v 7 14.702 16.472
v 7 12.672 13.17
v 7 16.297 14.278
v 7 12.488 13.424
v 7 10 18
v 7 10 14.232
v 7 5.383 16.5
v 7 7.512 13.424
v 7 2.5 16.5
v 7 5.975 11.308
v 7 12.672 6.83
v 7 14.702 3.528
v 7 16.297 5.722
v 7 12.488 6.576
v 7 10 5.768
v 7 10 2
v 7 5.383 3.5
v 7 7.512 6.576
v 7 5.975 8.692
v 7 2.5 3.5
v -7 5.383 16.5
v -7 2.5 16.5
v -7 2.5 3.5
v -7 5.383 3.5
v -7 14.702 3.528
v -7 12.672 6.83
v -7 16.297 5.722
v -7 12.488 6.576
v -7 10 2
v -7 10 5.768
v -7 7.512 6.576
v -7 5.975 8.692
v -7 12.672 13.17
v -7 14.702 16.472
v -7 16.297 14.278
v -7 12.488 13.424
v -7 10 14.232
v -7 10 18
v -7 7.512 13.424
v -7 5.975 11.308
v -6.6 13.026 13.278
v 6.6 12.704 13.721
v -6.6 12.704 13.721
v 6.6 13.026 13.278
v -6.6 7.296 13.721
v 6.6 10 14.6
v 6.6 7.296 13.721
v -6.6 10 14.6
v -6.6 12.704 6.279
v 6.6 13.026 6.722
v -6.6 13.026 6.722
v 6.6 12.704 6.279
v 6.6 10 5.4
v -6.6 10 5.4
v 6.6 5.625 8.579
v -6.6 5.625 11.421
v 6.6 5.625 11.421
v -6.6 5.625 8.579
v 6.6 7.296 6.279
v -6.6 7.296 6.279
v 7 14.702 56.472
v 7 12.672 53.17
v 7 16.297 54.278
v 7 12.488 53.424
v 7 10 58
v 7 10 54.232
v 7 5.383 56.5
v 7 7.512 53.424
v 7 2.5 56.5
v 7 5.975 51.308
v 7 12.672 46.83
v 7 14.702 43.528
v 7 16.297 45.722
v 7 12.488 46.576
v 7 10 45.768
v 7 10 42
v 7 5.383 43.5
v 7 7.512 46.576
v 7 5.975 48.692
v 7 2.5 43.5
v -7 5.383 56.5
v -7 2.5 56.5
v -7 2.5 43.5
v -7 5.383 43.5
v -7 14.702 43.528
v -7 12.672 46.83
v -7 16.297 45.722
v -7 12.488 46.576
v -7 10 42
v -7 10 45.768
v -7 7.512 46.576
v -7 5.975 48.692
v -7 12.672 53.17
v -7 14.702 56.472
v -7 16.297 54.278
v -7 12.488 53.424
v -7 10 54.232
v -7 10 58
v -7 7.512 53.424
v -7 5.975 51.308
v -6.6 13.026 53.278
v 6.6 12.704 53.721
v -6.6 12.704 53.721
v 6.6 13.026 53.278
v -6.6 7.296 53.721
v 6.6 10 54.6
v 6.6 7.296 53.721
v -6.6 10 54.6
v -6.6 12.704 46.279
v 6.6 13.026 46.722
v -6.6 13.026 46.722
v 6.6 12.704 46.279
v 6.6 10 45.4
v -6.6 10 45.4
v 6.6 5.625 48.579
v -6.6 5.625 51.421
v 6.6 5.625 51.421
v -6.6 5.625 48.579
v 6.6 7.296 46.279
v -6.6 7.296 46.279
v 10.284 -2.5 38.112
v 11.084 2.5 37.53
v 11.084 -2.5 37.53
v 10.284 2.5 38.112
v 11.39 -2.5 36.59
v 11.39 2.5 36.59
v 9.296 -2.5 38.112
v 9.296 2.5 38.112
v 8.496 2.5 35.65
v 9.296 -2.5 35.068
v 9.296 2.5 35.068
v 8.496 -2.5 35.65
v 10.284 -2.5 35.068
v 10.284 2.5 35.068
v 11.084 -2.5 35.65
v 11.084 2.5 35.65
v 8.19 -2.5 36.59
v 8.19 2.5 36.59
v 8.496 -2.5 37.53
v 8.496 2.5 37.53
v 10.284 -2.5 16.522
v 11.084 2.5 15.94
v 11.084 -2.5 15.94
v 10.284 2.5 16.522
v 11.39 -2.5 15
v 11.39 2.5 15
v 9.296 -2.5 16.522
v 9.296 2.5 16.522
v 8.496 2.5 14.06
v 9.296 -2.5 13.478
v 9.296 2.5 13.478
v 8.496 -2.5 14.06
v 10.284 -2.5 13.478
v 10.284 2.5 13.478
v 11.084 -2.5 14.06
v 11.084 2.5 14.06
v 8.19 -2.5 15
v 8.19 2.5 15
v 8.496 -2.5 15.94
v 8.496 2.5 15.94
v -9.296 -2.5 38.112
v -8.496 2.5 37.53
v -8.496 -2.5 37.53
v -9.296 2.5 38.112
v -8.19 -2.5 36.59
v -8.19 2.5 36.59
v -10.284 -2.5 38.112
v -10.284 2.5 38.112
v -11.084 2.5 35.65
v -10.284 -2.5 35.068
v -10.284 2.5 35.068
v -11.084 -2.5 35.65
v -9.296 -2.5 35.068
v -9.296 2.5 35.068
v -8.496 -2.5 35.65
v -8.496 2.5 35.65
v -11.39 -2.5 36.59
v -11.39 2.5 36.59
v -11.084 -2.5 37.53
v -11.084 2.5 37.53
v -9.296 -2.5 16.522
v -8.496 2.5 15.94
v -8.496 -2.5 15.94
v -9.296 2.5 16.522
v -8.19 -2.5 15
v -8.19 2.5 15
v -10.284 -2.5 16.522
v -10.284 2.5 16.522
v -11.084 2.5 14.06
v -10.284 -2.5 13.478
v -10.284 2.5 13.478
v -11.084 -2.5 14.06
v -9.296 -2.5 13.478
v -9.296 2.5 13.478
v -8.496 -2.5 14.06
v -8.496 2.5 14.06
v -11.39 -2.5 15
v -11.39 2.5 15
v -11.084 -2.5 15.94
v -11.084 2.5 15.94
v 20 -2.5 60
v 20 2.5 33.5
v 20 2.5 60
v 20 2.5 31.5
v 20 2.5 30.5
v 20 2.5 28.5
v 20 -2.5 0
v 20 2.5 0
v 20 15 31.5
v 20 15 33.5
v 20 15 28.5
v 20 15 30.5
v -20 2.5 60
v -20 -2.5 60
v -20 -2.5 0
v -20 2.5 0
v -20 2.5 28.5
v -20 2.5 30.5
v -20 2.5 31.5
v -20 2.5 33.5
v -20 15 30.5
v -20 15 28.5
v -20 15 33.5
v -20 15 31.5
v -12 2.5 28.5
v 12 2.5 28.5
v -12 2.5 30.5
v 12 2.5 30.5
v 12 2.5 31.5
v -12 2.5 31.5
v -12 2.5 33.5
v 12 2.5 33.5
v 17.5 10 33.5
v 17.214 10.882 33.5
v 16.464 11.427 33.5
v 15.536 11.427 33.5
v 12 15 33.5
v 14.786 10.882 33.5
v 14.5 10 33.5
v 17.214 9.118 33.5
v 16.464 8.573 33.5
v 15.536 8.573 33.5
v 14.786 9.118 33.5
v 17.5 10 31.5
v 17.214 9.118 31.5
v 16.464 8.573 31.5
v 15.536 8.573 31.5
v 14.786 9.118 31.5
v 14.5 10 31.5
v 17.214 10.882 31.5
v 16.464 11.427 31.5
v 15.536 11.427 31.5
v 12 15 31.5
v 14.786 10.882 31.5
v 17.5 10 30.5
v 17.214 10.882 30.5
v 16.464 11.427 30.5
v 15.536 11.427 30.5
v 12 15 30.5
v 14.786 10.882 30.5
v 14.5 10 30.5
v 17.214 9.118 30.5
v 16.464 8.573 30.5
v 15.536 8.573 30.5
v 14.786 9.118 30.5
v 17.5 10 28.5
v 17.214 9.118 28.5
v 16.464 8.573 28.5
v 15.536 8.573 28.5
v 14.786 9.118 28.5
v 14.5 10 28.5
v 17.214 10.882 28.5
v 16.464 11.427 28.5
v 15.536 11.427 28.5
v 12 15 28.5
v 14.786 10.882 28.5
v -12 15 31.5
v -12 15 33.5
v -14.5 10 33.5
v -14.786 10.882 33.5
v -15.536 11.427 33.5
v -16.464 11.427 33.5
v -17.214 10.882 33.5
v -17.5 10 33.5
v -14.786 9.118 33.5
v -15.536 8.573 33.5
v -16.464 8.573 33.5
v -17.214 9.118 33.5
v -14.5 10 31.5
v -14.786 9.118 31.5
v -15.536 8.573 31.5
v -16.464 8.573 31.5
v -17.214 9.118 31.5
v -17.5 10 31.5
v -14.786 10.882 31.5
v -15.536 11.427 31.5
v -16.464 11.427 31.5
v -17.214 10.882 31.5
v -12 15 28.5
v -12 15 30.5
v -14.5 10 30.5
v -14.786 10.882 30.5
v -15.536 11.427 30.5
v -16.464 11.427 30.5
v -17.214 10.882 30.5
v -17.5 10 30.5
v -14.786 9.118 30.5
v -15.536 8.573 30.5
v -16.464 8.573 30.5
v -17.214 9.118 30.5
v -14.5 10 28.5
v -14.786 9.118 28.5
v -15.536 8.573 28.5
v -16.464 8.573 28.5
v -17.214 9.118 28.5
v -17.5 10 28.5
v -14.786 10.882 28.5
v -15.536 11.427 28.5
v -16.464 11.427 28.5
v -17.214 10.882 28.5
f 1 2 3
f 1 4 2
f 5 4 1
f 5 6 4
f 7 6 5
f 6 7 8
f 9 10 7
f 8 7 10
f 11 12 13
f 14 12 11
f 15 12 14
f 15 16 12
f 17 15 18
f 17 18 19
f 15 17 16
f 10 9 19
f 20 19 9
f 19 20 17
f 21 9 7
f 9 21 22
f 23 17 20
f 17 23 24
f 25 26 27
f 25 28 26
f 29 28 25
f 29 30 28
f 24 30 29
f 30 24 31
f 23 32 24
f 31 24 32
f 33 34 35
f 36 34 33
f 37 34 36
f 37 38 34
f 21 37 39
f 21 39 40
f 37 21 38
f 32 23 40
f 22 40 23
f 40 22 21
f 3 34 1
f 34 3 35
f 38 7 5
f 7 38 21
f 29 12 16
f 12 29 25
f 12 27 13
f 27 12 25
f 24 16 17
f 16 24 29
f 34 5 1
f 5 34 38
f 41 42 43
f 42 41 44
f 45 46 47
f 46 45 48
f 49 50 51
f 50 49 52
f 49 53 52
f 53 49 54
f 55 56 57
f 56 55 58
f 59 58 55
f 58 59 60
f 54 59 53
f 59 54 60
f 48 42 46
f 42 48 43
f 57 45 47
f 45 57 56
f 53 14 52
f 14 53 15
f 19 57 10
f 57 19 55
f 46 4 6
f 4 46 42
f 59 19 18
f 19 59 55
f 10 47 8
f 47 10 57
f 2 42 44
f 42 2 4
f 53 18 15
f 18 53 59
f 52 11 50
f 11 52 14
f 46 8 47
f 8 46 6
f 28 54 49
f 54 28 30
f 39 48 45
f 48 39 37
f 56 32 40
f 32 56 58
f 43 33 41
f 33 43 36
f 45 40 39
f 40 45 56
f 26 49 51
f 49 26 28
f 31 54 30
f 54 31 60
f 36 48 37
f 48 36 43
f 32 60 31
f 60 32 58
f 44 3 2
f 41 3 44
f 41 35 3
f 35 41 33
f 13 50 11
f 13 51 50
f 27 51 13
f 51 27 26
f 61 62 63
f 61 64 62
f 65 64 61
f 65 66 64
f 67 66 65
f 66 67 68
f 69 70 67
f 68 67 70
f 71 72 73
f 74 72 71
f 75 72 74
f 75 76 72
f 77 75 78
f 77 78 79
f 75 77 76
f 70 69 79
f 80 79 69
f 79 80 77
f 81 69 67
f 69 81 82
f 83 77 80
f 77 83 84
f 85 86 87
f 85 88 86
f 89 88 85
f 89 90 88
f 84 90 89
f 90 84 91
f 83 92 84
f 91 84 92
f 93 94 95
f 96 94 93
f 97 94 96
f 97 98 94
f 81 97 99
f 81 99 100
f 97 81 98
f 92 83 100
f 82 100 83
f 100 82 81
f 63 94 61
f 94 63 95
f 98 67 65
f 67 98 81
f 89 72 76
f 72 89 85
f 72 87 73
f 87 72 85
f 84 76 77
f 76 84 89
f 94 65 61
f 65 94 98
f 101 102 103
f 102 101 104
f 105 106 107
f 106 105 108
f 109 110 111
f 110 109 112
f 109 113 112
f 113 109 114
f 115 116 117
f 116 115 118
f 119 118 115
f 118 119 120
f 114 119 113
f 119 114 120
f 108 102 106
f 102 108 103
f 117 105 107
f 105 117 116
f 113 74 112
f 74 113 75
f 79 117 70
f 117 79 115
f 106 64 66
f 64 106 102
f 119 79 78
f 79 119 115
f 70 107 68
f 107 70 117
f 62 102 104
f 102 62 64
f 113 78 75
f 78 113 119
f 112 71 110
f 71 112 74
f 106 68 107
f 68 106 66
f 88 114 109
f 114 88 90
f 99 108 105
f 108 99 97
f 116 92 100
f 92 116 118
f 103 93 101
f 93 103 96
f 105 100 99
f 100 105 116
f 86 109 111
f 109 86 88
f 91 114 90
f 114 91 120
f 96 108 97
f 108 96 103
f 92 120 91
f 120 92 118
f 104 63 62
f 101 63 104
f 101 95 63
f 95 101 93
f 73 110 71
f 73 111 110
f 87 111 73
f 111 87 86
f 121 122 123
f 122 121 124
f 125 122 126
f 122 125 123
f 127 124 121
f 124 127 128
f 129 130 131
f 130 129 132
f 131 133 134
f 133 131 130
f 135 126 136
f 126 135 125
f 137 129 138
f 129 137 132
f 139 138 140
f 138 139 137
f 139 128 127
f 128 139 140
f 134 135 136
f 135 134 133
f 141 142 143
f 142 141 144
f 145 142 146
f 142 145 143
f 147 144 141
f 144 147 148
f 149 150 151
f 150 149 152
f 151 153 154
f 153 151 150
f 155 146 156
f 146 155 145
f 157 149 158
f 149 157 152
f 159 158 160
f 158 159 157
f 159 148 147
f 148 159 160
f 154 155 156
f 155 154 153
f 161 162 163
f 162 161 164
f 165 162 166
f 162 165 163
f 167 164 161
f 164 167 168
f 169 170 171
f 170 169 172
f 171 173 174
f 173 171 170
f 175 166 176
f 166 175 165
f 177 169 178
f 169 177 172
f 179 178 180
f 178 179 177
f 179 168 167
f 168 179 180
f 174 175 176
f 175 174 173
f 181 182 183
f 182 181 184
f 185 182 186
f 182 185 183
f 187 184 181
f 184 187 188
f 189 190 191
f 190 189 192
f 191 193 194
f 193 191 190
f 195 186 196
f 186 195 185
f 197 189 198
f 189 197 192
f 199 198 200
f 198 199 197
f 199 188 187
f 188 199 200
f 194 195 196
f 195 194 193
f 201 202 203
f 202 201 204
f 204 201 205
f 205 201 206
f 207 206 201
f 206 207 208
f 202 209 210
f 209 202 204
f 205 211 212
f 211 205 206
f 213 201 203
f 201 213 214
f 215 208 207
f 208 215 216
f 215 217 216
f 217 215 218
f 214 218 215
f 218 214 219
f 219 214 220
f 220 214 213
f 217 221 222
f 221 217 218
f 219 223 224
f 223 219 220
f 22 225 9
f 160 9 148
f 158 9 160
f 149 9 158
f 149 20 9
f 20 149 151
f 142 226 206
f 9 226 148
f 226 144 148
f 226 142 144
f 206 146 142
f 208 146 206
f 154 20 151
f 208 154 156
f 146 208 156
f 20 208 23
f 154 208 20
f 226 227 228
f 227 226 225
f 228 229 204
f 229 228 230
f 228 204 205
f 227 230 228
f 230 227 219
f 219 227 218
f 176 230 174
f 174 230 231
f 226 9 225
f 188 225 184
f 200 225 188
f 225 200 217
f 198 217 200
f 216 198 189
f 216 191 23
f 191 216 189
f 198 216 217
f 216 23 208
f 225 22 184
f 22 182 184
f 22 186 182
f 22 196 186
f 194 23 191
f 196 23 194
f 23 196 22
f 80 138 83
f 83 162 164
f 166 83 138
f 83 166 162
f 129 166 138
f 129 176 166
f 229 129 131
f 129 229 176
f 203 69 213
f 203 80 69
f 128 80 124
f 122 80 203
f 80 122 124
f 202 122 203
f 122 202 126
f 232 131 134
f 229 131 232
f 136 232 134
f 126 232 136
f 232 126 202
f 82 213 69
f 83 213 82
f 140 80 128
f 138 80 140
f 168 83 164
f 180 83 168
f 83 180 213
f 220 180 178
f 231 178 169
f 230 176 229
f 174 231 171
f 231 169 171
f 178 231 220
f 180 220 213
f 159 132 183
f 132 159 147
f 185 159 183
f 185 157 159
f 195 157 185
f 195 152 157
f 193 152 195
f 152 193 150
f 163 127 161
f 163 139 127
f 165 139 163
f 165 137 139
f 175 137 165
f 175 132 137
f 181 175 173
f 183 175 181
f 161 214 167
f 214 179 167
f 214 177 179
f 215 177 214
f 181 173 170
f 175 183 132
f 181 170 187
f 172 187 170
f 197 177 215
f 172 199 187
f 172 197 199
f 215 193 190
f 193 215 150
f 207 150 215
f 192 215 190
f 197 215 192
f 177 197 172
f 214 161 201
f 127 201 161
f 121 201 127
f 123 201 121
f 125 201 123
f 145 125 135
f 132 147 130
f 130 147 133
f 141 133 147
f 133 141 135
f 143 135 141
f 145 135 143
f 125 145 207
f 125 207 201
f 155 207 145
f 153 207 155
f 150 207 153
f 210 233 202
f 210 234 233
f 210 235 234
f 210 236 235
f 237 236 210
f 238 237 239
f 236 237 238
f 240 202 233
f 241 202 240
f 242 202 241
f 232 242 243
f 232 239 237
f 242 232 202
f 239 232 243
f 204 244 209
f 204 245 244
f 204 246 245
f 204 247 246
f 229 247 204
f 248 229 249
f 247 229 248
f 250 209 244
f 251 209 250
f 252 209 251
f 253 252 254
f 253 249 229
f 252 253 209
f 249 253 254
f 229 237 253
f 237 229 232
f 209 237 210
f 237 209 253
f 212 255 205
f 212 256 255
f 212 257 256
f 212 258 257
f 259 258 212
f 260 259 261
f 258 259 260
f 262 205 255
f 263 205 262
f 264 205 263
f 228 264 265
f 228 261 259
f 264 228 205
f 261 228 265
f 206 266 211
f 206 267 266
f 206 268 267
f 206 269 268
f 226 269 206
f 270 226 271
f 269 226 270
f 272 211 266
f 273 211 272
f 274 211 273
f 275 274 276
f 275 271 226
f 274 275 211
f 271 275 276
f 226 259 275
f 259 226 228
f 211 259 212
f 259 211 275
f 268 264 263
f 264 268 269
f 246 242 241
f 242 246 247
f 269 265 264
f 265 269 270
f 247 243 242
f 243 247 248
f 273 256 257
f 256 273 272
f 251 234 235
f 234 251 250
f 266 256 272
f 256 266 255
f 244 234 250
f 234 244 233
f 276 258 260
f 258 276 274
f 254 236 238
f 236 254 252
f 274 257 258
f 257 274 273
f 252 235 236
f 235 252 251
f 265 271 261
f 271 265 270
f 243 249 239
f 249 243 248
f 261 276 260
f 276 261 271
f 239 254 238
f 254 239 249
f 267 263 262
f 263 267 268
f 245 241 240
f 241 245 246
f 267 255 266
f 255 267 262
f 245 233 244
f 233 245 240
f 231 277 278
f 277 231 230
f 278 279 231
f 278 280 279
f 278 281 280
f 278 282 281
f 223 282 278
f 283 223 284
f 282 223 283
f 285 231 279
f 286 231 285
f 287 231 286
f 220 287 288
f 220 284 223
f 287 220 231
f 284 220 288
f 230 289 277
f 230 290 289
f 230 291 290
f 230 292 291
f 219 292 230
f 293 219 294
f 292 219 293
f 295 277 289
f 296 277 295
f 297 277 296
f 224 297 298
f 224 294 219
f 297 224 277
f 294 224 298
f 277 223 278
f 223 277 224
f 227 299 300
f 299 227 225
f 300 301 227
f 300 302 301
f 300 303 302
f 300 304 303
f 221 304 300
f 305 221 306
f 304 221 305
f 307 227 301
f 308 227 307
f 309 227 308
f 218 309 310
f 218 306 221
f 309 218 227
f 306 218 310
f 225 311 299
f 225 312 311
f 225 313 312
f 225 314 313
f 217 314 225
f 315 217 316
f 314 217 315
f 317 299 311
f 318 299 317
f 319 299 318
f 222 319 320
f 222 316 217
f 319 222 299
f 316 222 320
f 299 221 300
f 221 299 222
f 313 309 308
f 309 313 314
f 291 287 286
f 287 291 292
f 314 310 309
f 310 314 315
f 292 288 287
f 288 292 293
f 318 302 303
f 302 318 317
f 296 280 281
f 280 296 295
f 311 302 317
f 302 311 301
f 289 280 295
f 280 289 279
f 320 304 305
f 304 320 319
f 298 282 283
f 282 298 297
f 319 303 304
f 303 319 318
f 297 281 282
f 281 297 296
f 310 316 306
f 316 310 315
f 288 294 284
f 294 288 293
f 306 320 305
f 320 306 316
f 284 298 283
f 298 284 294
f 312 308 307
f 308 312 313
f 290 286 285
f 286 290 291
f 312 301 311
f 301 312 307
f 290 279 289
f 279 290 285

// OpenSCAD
d_bearing = 8.00;
d_shaft = 4.00;
l_bearing = 12.00;
kerf = 0.6;
w_platform = 40.00;
w_block = 14.00;
h_platform=60;
t_platform = 5;

$fn=10;
module bearing() {
	height = l_bearing+2*kerf;
	rotate([0,90,0])
	union() {
		cylinder(r=(d_bearing/2)+kerf,height, center=true);
		translate([0,0,height/2]) cylinder(r1=(d_bearing/2)+kerf,r2=0,h=5);
		mirror([0,0,1]) translate([0,0,height/2]) cylinder(r1=(d_bearing/2)+kerf,r2=0,h=5);		
		cylinder(r=3.0, h=100, center=true);
	}
}

module bearing_block() {
	difference() {
		union() {
			translate([0,-(d_bearing+3)/2,0]) cube(size=[w_block,d_bearing+2.10,d_bearing+5], center=true);
			rotate([0,90,0]) cylinder(r=(d_bearing+8)/2,h=w_block,center=true);
		}
		translate([0,(d_bearing+2.1)/2,0]) cube(size=[w_block+1,d_bearing+2.1,d_bearing-3.5], center=true);
		rotate([17,0,0])  translate([0,(d_bearing+2.1)/2,0]) cube(size=[w_block+1,d_bearing+2.1,d_bearing-3.5], center=true);
		rotate([-17,0,0])  translate([0,(d_bearing+2.1)/2,0]) cube(size=[w_block+1,d_bearing+2.1,d_bearing-3.5], center=true);
		bearing();
	}
}

module m2hole() {rotate([90,0,0]) cylinder(r=1+kerf,h=20,center=true); }

module vertholes() {	
	sep=21.59;
	translate([0,0,sep]) m2hole();
	m2hole();
}

module mountholes() {
	hsep = 19.58;
	translate([hsep/2,0,0]) vertholes();
	translate([-hsep/2,0,0]) vertholes();
}

module printhead_platform() {
	difference() {
		translate([0,0,h_platform/2]) cube([w_platform, t_platform, h_platform],center=true);
		translate([0,0,15])
			mountholes();		
	}	
}

module belt_clamp() {
	difference() {
		union() {
			translate([-4,0,1.5]) cube([8,15,2]);
			translate([-4,0,-1.5]) cube([8,15,2]);
		}
		translate([0,10,-4]) cylinder(h=10,r=1.5);
	}
}

union() {
translate([0,10,10]) bearing_block();
translate([0,10,50]) bearing_block();
translate([0,0,0]) printhead_platform();
translate([16,0,30]) belt_clamp();
translate([-16,0,30]) belt_clamp();
}
